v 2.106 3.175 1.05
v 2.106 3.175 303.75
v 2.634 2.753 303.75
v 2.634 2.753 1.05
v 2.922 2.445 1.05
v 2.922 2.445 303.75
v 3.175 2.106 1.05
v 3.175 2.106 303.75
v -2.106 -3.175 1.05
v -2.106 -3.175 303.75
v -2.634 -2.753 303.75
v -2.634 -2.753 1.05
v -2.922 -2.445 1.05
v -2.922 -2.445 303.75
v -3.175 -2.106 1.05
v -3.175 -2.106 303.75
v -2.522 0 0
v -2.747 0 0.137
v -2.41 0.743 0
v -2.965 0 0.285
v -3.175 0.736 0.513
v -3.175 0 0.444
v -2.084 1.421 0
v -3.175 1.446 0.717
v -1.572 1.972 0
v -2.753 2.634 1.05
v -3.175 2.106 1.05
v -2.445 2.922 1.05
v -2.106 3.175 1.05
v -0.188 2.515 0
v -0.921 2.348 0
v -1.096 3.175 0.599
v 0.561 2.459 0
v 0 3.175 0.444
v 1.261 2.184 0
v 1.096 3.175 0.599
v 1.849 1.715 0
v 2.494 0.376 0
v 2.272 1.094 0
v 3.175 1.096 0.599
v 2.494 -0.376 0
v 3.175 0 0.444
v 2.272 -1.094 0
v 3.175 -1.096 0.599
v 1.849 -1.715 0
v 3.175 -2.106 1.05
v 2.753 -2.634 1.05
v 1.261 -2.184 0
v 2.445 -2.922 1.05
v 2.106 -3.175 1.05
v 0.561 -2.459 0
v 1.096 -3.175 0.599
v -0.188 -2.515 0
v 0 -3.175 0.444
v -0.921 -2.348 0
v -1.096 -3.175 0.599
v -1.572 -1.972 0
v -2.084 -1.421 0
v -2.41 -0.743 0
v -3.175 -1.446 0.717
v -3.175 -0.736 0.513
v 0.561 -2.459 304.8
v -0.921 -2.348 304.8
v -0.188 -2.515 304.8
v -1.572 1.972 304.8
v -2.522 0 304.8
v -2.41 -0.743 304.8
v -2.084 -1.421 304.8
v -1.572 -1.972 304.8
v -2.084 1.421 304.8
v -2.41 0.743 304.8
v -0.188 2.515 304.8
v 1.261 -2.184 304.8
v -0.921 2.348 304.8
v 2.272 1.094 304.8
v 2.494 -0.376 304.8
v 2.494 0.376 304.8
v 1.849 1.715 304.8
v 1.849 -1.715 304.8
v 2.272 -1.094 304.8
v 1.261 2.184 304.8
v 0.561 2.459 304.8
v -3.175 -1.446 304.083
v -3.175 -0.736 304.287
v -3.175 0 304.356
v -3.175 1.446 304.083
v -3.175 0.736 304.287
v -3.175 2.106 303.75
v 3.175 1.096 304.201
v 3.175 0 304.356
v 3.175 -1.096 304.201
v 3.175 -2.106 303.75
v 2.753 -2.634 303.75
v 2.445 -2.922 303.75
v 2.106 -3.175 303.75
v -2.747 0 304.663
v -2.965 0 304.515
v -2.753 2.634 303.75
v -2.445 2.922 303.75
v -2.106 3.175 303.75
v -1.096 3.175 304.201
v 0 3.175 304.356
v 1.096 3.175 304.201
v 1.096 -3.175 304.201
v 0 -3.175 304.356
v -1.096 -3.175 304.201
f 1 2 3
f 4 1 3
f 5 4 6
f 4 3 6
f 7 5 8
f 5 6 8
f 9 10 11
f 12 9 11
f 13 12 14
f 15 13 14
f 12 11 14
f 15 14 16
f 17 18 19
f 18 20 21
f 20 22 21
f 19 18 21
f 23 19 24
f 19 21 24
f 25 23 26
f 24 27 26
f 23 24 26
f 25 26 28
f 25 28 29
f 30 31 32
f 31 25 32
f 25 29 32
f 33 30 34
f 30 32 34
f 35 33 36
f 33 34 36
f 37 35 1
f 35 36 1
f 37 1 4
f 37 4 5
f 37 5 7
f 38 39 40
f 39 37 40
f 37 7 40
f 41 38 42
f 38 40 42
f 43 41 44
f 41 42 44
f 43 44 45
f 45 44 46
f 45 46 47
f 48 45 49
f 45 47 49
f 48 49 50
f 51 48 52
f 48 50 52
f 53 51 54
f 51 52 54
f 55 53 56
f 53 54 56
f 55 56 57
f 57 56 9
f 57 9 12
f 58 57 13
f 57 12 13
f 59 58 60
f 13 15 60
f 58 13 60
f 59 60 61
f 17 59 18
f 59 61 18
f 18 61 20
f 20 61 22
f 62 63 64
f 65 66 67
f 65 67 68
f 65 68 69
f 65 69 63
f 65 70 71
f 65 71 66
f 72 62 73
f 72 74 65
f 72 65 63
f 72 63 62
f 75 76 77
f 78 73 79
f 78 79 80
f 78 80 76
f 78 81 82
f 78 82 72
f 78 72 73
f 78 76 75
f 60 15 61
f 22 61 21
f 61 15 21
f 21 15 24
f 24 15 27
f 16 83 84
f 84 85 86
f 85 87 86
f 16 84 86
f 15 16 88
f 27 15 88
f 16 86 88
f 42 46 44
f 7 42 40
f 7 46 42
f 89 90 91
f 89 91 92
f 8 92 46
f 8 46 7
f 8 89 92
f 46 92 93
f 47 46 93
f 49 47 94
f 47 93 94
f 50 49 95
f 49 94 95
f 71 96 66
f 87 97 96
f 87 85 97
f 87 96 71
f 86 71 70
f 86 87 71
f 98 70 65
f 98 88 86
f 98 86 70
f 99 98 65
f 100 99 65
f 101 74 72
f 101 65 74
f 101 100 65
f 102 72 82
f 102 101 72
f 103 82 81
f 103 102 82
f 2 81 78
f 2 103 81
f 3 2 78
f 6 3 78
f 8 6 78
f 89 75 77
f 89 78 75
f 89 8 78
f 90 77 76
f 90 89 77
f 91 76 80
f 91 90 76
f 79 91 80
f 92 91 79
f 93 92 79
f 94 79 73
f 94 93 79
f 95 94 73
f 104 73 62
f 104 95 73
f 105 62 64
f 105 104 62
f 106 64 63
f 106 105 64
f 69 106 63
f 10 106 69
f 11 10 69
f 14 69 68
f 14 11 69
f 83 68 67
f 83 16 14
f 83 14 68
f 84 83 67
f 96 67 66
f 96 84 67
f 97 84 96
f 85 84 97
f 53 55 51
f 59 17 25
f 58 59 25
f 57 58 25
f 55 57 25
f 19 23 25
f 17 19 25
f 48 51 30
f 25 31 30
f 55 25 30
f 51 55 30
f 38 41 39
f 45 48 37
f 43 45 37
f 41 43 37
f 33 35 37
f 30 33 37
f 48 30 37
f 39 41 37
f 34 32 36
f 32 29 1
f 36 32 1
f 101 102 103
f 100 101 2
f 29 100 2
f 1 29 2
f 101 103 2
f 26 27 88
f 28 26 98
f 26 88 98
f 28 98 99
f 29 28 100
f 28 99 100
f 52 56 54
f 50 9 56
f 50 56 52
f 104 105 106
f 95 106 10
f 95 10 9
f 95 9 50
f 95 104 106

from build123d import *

# Parameters (mm, degrees)
SKETCH1_W           = 6.35
SKETCH1_H           = 6.35
BOSS_EXTRUDE1_DEPTH = 152.4
SKETCH2_OUTSIDE_W   = 38.882
SKETCH2_OUTSIDE_H   = 38.882
SKETCH2_OUTSIDE_R   = 3.81
CUT_EXTRUDE1_DEPTH  = 153.4


with BuildPart() as part:
    # Sketch1 → Boss-Extrude1 (new body)
    with BuildSketch(Plane.XY):
        Rectangle(SKETCH1_W, SKETCH1_H)
    extrude(amount=BOSS_EXTRUDE1_DEPTH)

    # Sketch2 outside → Cut-Extrude1 (cut, through all)
    with BuildSketch(Plane(origin=(0, 0, 0), x_dir=(-1, 0, 0), z_dir=(0, 0, -1))):
        Rectangle(SKETCH2_OUTSIDE_W, SKETCH2_OUTSIDE_H)
        Circle(SKETCH2_OUTSIDE_R, mode=Mode.SUBTRACT)
    extrude(amount=-CUT_EXTRUDE1_DEPTH, mode=Mode.SUBTRACT)

    # Sketch3 → Cut-Revolve1 (revolve, cut)
    with BuildSketch(Plane(origin=(0, 0, 0), x_dir=(1, 0, 0), z_dir=(0, 1, 0))):
        with BuildLine():
            Line((-5.053685963, -3.893335876), (-5.053685963, 5.740530545))
            Line((-5.053685963, 5.740530545), (0, 5.740530545))
            Line((0, 5.740530545), (0, 0.670274551))
            ThreePointArc((0, 0.670274551), (-3.404639553, -0.639469554), (-5.053685963, -3.893335876))
        make_face()
    revolve(axis=Axis((0, 0, 152.4), (0, 0, -1)), mode=Mode.SUBTRACT)

    # Mirror1: part across plane


with BuildPart() as part_1:
    add(part.part)
    add(part.part.mirror(Plane(origin=(0, 0, 152.4), x_dir=(1, 0, 0), z_dir=(0, 0, -1))))


solid = part_1.part
